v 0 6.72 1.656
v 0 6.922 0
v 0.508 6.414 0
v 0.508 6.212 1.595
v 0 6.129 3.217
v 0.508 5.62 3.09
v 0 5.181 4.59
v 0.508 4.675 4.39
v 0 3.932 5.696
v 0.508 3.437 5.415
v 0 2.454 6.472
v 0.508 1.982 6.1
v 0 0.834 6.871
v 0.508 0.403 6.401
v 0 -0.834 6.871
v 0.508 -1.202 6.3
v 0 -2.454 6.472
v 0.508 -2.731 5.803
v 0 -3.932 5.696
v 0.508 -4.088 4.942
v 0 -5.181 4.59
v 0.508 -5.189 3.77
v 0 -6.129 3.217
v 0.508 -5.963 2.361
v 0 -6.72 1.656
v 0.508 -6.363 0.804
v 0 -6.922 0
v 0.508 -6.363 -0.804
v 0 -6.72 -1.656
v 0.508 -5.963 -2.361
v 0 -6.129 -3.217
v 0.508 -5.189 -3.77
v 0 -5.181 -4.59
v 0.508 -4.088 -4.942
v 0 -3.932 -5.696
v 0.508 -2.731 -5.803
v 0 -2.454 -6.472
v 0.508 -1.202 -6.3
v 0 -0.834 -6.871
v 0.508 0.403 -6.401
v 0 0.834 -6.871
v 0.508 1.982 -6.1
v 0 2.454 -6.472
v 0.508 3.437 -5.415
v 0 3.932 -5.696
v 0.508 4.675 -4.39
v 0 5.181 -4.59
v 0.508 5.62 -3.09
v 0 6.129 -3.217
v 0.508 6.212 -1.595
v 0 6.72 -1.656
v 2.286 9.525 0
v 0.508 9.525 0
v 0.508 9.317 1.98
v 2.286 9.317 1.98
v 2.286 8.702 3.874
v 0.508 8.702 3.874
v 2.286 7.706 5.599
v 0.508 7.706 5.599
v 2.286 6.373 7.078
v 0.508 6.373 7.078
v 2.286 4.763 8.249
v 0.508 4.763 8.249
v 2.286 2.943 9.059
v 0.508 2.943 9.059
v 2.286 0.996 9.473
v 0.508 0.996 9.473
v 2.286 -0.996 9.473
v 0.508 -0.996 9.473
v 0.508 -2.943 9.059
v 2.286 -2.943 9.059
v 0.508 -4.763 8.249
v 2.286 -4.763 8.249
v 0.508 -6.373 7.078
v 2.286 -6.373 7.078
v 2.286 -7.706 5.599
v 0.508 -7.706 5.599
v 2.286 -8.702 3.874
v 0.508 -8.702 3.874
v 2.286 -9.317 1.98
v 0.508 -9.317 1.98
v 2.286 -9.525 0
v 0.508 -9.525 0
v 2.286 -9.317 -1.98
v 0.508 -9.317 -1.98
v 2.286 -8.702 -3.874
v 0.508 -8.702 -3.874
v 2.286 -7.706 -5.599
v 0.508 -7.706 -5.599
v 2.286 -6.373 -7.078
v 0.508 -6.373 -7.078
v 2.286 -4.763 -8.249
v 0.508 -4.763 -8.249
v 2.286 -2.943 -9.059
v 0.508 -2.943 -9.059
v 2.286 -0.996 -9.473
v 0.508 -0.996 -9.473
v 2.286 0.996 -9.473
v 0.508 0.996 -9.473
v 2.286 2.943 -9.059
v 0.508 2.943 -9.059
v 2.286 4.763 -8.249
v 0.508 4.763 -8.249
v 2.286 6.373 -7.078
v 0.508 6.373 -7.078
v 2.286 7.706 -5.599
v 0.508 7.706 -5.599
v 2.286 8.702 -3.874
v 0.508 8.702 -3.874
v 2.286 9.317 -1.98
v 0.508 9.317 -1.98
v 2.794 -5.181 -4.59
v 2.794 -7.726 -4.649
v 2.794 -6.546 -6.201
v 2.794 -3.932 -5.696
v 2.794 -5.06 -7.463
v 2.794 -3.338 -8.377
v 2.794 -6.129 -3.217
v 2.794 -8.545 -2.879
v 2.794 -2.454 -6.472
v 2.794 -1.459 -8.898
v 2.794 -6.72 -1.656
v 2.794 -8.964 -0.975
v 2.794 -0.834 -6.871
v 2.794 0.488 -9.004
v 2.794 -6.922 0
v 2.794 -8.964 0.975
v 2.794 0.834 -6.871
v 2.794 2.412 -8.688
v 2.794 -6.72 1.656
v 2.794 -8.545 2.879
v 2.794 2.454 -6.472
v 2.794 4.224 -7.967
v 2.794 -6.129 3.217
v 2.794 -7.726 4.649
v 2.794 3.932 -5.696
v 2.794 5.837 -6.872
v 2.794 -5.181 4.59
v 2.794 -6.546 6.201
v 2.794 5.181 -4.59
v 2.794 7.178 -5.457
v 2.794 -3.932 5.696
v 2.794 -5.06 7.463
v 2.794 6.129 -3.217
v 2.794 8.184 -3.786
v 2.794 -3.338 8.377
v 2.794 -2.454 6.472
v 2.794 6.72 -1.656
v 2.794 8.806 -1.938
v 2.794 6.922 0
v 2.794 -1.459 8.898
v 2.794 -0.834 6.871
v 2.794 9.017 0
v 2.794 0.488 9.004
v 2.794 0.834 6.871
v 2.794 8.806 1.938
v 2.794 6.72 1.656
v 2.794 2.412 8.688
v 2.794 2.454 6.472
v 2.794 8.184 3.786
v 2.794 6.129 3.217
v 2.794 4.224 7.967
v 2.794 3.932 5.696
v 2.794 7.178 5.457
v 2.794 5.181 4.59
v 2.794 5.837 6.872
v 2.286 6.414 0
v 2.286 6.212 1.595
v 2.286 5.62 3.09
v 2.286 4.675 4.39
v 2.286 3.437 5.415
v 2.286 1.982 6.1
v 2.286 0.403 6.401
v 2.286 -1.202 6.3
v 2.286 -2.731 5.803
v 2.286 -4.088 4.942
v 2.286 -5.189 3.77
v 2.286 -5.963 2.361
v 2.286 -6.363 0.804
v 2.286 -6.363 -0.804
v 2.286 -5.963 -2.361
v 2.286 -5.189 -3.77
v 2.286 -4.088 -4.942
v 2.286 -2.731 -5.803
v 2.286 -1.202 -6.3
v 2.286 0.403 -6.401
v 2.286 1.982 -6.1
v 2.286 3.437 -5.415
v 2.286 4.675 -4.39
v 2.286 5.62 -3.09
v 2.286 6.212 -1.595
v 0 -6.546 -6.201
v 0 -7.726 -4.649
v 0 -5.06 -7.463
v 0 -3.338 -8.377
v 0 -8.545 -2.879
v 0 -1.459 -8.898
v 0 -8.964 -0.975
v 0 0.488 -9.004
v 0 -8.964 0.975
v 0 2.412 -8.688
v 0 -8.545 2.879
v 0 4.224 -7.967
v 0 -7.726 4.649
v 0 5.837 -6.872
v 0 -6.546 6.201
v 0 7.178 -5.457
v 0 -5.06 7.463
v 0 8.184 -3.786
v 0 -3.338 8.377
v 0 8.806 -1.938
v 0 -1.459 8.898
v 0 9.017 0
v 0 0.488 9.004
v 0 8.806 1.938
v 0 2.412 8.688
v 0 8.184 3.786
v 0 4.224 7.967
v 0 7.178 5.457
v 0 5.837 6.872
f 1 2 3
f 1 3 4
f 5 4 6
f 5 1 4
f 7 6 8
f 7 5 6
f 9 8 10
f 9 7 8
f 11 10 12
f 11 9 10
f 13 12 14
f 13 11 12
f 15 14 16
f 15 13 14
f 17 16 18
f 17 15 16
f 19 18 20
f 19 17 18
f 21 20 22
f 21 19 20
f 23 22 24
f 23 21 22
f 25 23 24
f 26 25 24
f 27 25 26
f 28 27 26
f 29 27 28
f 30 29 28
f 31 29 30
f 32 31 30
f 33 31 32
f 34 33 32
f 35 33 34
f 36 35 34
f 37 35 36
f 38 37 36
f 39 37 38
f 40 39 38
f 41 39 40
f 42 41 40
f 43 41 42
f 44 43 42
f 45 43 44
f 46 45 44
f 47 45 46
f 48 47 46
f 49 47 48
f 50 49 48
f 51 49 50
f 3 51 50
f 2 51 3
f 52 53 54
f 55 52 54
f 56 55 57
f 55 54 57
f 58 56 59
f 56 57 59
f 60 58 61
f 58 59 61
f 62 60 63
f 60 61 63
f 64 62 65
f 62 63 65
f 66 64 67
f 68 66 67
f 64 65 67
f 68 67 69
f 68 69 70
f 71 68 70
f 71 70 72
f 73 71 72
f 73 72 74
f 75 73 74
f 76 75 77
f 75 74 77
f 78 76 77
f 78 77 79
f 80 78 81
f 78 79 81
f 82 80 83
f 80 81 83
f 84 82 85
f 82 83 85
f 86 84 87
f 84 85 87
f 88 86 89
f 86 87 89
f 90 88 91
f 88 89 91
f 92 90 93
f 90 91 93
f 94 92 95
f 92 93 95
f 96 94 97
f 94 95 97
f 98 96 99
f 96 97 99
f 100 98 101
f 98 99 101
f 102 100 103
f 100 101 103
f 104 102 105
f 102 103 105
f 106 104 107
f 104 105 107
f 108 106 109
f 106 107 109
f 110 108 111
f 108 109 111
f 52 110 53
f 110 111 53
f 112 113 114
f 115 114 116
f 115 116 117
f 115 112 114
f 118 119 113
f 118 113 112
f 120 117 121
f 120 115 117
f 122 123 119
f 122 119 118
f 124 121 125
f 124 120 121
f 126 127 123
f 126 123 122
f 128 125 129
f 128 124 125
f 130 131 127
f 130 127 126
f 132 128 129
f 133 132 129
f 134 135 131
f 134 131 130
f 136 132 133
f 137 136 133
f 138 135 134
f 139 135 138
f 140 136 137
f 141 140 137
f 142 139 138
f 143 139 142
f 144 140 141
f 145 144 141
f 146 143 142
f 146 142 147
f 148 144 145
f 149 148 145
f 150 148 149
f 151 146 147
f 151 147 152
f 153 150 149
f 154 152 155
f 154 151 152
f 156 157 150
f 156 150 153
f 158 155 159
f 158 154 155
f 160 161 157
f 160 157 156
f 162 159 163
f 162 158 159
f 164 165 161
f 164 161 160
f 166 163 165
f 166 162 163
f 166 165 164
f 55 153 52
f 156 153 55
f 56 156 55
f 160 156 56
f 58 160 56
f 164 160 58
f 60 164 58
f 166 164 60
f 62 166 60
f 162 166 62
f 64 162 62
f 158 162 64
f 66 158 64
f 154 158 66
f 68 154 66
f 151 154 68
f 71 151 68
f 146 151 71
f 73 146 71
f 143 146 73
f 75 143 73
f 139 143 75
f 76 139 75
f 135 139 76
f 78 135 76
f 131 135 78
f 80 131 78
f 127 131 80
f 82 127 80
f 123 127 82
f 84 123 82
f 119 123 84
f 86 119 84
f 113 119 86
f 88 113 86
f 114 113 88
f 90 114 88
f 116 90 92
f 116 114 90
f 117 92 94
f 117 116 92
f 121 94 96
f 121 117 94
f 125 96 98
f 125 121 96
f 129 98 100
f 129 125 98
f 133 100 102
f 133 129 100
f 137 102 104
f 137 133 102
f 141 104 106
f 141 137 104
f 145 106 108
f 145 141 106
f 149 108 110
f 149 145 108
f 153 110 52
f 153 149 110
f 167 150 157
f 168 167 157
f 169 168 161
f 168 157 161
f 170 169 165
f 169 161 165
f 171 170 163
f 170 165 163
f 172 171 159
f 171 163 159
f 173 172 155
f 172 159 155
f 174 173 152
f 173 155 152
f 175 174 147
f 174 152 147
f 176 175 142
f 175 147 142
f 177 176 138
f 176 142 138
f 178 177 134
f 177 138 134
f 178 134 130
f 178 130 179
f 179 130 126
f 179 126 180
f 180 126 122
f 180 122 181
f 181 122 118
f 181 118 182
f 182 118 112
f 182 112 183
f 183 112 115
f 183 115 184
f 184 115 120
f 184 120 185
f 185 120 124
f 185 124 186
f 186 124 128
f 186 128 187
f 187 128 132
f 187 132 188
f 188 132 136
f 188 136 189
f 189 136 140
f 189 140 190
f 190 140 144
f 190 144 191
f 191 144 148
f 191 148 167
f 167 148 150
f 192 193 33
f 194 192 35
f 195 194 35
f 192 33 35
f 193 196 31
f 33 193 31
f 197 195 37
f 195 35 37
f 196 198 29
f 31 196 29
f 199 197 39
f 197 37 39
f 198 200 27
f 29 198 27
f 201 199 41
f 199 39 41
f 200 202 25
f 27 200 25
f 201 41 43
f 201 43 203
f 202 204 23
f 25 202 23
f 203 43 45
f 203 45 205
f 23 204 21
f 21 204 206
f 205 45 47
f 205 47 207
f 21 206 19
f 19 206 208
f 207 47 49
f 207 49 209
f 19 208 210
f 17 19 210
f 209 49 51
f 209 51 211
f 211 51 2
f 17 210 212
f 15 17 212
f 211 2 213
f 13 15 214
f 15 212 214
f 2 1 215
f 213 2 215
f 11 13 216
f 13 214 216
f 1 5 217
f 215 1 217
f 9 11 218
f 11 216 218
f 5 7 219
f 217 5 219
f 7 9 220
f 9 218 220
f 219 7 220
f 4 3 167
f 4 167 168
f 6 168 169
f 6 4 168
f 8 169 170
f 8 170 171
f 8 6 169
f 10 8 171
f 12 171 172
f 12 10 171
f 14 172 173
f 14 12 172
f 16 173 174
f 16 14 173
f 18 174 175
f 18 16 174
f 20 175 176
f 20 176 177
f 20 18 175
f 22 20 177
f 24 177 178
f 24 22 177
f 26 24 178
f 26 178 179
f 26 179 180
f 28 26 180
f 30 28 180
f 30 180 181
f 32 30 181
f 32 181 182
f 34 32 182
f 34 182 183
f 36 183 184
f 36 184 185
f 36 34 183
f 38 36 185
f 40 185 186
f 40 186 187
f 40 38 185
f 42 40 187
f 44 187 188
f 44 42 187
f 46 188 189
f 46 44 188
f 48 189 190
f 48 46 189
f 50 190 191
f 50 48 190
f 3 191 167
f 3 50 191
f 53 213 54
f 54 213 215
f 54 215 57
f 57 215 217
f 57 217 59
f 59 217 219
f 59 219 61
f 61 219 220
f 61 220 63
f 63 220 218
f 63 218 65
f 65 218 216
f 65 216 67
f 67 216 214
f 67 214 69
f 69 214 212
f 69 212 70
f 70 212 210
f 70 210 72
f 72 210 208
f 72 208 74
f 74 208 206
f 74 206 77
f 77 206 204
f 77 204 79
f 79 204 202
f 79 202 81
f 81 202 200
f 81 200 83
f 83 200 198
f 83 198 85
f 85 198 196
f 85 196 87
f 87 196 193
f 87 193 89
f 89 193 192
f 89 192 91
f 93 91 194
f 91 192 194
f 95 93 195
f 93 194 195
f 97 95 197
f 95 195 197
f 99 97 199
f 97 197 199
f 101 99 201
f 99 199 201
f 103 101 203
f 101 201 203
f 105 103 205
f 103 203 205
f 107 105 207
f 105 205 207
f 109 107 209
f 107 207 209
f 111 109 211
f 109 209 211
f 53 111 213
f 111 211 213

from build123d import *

# Parameters (mm, degrees)
F0_R     = 9.525
F0_R_2   = 6.4135
F1_DEPTH = 2.794
F2_SIZE  = 0.508


with BuildPart() as f1:
    # F0 (on Right) → F1 (new body)
    with BuildSketch(Plane.YZ):
        Circle(F0_R)
        Circle(F0_R_2, mode=Mode.SUBTRACT)
    extrude(amount=F1_DEPTH)

    # F2
    f2_edges = [f1.edges().sort_by_distance(p)[0] for p in [
        (1.397, 6.4135, 0),
        (0, -6.4135, 0),
        (2.794, -6.4135, 0),
        (1.397, 9.525, 0),
        (0, -9.525, 0),
        (2.794, -9.525, 0),
    ]]
    chamfer(f2_edges, length=F2_SIZE)


solid = f1.part
